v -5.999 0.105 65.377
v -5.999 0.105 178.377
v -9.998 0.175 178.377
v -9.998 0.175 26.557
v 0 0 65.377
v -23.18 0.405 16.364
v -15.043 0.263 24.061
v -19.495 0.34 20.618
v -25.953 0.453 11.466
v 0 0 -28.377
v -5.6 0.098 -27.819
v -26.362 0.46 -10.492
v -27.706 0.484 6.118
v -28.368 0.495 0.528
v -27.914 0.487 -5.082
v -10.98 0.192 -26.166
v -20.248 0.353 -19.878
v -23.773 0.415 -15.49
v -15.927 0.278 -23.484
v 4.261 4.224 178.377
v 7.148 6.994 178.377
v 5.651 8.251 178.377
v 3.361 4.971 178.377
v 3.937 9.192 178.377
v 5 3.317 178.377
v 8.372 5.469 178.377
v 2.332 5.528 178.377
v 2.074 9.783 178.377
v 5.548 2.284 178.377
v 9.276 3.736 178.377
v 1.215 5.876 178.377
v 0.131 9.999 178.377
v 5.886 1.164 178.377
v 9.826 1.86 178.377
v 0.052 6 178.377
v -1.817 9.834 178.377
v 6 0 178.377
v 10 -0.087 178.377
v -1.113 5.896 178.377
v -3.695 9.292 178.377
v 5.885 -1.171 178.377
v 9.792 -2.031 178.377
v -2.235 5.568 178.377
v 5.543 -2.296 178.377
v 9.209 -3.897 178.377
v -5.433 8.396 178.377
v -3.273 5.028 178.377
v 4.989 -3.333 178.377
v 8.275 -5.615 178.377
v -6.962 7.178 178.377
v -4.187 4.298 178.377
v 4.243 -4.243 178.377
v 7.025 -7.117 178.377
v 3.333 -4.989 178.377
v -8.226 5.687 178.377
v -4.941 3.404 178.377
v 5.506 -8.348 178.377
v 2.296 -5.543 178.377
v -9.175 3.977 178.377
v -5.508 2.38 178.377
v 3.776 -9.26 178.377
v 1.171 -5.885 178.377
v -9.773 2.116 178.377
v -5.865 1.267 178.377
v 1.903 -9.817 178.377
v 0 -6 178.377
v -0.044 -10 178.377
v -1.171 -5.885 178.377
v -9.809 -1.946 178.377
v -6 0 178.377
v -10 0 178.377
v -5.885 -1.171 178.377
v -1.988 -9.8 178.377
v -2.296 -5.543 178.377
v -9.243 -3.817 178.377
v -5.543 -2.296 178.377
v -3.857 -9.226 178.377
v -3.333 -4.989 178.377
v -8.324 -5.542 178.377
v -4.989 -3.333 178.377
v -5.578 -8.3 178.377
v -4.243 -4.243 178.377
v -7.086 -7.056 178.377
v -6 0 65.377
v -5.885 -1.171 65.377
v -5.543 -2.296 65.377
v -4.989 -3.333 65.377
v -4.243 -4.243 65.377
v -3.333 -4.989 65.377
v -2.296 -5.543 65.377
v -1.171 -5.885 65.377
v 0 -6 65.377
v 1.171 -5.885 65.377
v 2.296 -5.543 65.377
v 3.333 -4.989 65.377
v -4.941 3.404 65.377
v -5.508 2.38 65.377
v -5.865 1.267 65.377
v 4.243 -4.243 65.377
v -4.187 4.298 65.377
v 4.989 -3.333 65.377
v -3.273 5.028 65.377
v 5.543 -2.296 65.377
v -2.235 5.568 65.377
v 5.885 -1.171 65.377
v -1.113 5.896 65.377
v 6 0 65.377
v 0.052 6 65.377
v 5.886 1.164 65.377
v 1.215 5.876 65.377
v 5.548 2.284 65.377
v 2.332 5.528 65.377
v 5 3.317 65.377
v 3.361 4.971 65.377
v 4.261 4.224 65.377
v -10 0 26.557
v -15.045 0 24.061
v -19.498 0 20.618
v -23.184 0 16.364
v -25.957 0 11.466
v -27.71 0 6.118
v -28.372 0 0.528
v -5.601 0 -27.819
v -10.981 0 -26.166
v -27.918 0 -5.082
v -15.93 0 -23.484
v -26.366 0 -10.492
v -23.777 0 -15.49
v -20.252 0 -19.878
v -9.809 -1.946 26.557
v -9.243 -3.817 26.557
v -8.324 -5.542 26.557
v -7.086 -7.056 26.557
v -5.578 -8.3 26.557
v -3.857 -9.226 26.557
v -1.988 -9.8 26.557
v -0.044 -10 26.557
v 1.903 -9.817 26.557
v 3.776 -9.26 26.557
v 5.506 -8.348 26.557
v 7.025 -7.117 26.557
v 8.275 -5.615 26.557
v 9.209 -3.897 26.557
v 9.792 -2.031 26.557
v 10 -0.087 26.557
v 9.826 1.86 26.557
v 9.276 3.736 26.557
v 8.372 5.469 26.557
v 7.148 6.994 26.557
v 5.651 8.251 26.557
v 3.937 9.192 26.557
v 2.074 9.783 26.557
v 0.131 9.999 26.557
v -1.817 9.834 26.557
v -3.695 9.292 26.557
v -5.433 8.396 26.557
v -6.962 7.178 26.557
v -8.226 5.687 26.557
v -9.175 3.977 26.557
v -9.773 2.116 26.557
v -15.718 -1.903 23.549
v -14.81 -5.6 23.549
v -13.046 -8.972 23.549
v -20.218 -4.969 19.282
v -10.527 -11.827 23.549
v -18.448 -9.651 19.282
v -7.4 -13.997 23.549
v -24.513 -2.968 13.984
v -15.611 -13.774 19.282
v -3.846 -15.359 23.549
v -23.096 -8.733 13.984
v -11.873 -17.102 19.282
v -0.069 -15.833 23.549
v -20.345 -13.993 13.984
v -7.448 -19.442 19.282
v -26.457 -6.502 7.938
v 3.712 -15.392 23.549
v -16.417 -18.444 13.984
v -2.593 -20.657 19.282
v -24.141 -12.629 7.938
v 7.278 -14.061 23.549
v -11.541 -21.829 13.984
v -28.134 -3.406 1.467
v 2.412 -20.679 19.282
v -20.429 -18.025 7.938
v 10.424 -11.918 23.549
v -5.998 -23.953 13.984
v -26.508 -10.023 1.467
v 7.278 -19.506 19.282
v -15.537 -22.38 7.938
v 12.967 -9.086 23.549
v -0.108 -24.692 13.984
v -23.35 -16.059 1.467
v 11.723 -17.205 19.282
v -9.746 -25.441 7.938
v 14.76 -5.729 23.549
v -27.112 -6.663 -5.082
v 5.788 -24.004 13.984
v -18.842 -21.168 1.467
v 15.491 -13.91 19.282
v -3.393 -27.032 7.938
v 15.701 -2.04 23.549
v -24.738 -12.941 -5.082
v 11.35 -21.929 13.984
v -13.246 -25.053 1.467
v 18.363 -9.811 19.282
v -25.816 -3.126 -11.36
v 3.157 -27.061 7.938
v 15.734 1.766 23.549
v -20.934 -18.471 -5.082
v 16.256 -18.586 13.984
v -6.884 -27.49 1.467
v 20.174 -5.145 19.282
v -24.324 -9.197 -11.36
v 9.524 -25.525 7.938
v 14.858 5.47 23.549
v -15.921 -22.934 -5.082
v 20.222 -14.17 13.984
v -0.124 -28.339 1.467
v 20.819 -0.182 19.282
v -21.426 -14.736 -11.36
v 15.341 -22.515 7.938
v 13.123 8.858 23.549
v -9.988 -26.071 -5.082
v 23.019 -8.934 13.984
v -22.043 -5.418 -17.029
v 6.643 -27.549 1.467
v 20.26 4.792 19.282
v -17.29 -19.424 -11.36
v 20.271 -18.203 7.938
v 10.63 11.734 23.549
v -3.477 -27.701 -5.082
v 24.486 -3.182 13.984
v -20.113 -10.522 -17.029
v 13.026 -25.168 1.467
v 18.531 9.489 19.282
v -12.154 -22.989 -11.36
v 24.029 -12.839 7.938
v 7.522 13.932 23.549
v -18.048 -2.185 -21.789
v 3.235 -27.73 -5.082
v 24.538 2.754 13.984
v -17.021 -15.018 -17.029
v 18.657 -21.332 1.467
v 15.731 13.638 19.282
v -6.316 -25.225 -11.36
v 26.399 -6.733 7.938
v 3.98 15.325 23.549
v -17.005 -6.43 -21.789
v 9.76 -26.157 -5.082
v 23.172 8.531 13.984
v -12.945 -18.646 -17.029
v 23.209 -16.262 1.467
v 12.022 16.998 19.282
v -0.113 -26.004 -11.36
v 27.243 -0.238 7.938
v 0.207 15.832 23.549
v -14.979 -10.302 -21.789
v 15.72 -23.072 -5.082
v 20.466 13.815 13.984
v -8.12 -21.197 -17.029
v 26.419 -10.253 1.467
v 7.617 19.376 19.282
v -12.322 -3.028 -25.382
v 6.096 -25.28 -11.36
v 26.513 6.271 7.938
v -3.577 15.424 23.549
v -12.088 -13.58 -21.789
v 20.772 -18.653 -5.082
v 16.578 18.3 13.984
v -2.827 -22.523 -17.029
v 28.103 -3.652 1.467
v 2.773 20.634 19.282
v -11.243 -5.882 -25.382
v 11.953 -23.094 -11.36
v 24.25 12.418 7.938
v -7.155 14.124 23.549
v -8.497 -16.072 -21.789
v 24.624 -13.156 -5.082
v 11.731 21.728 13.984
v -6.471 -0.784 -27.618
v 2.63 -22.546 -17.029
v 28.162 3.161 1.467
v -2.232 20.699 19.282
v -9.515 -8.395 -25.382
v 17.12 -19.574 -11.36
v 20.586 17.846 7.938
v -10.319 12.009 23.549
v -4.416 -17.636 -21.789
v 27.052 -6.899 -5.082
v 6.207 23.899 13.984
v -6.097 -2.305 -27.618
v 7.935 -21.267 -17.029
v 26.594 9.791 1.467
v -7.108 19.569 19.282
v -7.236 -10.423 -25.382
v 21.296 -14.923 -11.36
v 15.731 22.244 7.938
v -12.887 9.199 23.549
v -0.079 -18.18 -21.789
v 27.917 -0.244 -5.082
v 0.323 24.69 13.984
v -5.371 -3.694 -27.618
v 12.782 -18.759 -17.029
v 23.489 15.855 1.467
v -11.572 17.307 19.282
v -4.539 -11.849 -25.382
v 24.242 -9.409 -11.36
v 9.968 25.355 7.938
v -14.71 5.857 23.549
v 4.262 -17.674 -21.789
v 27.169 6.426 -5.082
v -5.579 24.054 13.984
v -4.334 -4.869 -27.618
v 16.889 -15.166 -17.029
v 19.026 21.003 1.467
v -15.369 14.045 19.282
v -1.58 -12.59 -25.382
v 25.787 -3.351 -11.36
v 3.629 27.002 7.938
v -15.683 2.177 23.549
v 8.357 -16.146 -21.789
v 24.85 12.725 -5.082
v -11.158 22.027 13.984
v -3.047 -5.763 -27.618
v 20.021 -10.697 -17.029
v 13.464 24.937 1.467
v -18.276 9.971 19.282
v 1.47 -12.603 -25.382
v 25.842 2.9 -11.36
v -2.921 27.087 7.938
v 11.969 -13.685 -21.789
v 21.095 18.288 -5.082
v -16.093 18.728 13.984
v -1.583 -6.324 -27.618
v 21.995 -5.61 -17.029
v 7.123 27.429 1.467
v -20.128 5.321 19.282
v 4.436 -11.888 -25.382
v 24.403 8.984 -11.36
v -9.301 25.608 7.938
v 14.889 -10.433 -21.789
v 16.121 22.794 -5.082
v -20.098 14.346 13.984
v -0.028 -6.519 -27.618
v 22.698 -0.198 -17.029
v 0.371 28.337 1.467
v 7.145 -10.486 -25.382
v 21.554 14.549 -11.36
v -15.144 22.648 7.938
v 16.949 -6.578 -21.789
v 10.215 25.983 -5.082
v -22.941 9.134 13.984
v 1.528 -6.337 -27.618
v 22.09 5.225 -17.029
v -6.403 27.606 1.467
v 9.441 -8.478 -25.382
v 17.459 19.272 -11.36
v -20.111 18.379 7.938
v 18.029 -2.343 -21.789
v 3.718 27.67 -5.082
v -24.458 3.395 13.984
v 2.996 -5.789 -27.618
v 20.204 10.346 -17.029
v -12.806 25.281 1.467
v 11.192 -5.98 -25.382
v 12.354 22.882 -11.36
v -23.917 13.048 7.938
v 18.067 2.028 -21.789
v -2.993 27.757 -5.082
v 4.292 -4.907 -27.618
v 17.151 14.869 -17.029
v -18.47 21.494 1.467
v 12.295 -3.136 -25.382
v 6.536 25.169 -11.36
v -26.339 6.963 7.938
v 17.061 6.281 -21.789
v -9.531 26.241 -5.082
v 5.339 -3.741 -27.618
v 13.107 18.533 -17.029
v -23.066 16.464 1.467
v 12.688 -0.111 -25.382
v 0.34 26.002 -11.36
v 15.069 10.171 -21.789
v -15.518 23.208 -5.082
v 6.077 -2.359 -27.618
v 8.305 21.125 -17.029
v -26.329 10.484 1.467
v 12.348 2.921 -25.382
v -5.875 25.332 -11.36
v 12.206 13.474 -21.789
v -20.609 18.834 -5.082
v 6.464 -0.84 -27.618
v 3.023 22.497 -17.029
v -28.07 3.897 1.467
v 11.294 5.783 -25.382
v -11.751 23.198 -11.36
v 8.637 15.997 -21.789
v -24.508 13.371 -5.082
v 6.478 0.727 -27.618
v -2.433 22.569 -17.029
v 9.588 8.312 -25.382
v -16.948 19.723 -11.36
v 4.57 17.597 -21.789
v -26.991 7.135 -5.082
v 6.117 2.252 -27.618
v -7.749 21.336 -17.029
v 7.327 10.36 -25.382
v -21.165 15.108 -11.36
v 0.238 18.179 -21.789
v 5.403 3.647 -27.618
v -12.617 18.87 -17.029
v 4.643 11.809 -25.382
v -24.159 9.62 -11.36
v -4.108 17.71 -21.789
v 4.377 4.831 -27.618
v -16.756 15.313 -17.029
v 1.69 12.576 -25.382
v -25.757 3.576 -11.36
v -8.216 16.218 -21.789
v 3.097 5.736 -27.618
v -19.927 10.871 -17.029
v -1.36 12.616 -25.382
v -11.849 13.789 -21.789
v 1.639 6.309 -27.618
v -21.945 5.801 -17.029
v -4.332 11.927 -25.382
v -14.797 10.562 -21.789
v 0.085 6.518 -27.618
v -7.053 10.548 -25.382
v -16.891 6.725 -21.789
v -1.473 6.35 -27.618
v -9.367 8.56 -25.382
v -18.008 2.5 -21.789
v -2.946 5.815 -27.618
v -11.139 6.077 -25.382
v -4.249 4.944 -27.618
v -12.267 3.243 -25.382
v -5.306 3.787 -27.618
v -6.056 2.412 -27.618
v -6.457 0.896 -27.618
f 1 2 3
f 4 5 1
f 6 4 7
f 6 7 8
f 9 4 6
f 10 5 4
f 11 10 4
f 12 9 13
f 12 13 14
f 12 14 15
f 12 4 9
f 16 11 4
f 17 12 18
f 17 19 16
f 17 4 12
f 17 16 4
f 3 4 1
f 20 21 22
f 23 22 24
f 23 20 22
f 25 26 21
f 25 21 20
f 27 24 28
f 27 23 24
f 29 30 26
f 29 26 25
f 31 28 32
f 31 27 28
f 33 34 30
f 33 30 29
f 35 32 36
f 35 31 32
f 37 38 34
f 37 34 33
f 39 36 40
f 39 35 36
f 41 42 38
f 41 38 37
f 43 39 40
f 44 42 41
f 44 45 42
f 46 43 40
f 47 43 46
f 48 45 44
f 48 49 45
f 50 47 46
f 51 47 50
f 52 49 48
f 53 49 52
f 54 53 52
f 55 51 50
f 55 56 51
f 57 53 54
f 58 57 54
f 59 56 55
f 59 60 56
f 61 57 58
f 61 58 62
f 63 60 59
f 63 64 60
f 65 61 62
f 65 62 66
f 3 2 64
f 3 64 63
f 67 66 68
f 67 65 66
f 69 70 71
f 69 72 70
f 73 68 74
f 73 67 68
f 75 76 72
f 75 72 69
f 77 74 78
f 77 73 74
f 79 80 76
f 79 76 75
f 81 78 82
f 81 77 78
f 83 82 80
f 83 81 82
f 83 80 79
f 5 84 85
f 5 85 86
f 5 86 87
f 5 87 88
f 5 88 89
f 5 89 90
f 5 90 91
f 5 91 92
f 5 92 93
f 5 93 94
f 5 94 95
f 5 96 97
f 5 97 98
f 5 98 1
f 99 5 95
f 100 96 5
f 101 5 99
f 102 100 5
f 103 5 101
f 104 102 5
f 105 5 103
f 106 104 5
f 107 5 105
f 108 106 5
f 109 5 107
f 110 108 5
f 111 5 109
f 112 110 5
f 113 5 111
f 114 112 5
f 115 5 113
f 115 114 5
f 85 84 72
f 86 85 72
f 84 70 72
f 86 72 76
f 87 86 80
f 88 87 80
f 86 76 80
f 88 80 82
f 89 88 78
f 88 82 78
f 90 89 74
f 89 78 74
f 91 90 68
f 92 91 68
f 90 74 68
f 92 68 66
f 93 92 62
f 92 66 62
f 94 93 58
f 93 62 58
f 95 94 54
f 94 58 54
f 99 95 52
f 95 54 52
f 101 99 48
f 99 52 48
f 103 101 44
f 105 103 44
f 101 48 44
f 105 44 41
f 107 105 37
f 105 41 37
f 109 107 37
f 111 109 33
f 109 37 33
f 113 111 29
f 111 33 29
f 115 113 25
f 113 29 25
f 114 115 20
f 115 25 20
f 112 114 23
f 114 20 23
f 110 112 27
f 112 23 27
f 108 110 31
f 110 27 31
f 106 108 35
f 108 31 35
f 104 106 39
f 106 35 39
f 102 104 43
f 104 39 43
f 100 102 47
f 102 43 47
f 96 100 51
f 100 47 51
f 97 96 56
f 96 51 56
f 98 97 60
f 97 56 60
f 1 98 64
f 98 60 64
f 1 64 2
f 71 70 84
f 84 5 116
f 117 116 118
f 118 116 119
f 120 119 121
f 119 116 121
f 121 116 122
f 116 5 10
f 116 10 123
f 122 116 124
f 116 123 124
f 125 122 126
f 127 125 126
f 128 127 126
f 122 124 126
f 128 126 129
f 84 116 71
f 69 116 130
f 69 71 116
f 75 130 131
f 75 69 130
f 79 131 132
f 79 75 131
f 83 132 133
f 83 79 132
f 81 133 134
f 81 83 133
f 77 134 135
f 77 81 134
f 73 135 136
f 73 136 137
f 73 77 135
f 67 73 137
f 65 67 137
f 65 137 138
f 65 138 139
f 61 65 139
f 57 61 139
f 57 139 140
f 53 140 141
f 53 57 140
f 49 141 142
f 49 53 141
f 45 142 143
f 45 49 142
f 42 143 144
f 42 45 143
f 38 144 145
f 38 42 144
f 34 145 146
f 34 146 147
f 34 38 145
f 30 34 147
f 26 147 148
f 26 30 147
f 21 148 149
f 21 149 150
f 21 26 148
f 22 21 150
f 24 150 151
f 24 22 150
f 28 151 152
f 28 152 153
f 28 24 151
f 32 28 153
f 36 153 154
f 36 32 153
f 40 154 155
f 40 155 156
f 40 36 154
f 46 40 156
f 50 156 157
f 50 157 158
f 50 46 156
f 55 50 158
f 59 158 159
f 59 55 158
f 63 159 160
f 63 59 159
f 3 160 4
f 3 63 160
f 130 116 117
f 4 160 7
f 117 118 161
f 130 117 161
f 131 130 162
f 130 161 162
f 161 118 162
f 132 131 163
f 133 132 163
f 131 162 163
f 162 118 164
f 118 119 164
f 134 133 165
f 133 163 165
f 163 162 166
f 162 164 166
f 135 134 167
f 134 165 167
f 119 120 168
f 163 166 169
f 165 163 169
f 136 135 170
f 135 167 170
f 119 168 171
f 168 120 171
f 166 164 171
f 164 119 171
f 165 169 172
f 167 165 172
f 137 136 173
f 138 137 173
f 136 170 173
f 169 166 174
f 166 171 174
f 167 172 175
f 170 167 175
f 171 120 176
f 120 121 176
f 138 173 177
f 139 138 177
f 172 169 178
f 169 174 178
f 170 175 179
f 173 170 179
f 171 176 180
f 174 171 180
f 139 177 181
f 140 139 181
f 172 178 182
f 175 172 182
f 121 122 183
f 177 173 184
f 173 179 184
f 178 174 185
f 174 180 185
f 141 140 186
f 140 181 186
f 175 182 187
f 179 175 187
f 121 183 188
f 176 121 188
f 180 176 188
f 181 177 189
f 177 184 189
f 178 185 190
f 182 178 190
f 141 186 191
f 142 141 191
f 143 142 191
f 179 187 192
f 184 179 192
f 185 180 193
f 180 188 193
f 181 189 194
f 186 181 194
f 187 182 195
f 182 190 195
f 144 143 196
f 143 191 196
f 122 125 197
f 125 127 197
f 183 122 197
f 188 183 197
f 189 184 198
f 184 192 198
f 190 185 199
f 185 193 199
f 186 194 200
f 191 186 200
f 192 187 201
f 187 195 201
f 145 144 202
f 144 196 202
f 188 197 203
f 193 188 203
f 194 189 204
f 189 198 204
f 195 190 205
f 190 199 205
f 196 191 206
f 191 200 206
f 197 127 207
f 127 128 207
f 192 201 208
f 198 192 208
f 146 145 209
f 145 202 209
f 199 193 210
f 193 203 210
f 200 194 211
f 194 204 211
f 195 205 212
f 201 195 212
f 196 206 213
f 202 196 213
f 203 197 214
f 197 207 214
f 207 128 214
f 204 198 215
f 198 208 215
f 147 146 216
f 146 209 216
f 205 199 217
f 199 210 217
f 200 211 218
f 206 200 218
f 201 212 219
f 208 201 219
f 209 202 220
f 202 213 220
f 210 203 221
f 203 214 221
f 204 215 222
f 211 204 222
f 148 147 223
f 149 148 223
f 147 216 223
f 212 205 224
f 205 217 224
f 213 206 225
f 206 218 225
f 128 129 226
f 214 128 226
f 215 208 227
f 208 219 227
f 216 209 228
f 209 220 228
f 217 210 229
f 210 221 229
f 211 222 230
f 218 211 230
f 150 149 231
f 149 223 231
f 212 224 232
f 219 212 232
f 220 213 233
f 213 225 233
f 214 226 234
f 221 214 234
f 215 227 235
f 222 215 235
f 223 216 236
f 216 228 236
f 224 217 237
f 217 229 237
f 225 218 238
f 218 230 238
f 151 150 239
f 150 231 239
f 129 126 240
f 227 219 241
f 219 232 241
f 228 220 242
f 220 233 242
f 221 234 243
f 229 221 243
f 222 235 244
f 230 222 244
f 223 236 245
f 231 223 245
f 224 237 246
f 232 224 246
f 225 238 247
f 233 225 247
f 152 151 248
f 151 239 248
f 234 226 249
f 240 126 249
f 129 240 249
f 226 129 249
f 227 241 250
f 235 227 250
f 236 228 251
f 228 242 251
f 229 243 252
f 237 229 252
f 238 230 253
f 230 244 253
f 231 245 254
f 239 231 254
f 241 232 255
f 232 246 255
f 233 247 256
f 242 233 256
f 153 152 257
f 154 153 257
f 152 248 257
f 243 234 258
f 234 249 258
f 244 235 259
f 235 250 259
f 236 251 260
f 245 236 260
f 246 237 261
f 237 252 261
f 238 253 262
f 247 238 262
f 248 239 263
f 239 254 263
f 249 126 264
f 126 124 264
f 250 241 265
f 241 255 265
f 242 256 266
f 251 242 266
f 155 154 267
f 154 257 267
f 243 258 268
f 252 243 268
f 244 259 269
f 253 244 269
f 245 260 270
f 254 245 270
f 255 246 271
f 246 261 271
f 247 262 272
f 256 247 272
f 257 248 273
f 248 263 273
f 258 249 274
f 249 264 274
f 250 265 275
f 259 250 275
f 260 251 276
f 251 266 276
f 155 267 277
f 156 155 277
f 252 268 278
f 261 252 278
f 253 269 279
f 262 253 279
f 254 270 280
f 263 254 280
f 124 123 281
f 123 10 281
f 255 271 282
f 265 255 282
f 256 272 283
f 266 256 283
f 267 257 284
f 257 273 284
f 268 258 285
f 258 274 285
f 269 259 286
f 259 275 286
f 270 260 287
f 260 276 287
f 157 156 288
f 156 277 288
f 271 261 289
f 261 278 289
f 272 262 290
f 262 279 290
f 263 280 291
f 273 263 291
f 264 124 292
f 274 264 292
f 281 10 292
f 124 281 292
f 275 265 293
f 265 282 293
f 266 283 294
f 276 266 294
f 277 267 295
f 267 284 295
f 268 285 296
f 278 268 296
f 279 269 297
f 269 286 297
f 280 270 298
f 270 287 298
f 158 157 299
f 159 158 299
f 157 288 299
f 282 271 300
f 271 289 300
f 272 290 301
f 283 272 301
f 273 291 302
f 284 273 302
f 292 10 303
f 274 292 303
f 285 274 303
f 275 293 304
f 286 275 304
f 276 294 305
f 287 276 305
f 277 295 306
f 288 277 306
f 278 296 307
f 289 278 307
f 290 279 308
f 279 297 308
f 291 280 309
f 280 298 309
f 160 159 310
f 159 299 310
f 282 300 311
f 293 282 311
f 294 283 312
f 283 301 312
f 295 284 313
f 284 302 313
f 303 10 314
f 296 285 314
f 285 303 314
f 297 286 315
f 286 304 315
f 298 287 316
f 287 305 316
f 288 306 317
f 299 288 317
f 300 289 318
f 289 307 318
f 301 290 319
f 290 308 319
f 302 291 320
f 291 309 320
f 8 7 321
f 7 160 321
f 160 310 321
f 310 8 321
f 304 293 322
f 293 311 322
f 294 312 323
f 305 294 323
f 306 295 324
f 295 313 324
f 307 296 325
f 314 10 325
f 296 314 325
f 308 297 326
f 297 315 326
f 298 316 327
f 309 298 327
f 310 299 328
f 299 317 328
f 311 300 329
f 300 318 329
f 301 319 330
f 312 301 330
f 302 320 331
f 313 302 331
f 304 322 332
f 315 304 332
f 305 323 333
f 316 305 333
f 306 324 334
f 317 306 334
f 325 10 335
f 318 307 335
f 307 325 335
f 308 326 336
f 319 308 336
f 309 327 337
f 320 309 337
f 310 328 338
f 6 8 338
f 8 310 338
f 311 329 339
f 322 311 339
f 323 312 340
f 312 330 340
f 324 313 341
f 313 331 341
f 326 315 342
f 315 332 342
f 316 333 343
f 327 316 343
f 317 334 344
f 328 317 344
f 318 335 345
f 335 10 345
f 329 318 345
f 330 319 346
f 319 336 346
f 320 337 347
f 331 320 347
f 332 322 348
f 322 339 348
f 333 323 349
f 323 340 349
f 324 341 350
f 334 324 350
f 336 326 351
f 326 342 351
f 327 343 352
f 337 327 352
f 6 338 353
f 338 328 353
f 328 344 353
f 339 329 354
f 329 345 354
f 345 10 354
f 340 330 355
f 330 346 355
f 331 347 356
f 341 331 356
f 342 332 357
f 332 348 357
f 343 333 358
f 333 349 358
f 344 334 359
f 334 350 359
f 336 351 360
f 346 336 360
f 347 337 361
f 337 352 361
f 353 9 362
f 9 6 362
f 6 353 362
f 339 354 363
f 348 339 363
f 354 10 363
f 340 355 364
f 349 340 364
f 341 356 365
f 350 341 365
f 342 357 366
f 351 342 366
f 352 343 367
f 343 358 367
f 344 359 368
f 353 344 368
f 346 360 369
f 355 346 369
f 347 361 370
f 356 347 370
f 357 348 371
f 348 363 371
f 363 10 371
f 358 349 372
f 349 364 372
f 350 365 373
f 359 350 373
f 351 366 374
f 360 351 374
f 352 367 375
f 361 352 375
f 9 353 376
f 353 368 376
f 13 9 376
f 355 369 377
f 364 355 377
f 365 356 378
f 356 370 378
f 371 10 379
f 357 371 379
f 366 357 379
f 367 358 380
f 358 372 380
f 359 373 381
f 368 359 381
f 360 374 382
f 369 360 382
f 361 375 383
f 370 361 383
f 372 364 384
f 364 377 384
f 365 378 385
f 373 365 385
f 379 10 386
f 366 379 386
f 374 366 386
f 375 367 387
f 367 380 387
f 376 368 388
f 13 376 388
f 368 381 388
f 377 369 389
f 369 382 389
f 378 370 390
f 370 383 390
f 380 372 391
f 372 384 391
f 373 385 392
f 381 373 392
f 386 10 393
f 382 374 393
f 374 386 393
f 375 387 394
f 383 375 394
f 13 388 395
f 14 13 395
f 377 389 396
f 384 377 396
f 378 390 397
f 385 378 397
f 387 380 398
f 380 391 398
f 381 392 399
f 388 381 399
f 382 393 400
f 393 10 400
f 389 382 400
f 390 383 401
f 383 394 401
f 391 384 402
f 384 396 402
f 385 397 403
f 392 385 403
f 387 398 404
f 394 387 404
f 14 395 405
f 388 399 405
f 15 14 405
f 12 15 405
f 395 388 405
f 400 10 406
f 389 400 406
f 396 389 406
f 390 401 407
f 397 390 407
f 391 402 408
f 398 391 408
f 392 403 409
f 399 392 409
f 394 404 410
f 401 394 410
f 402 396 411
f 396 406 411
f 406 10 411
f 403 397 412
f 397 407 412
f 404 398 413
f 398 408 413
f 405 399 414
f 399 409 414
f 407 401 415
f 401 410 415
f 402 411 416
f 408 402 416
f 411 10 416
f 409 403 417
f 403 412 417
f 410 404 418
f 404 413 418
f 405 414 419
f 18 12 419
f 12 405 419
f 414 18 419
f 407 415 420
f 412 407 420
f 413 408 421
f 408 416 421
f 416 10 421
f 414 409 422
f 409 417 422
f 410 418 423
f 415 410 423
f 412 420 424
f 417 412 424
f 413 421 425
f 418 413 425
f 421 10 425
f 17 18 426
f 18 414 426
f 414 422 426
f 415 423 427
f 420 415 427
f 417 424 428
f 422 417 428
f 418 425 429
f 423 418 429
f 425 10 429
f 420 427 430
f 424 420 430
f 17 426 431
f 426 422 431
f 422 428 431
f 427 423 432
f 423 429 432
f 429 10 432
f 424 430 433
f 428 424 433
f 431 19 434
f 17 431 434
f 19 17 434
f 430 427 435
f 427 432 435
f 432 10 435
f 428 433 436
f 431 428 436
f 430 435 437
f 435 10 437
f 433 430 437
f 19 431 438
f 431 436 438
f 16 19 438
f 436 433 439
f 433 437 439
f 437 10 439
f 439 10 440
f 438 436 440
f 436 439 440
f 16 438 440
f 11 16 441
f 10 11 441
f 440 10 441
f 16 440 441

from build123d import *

# Parameters (mm, degrees)
REVOLVE4_ANGLE     = 359
SKETCH9_R          = 6
CUT_EXTRUDE2_DEPTH = 113


with BuildPart() as part:
    # Sketch2 → Revolve4 (revolve)
    with BuildSketch(Plane(origin=(0, 0, 0), x_dir=(1, 0, 0), z_dir=(0, 1, 0))):
        with BuildLine():
            Line((0, 28.377137052), (0, -28.377137052))
            ThreePointArc((0, -28.377137052), (-28.377137052, 0), (0, 28.377137052))
        make_face()
        with BuildLine():
            Line((0, -178.377137052), (0, -28.377137052))
            ThreePointArc((0, -28.377137052), (-5.082168455, -27.91833575), (-10, -26.556767636))
            Line((-10, -26.556767636), (-10, -178.377137052))
            Line((-10, -178.377137052), (0, -178.377137052))
        make_face()
    revolve(axis=Axis((0, 0, 28.377137052), (0, 0, 1)), revolution_arc=REVOLVE4_ANGLE)

    # Sketch9 → Cut-Extrude2 (cut)
    with BuildSketch(Plane.XY.offset(178.377137052)):
        Circle(SKETCH9_R)
    extrude(amount=-CUT_EXTRUDE2_DEPTH, mode=Mode.SUBTRACT)


solid = part.part
